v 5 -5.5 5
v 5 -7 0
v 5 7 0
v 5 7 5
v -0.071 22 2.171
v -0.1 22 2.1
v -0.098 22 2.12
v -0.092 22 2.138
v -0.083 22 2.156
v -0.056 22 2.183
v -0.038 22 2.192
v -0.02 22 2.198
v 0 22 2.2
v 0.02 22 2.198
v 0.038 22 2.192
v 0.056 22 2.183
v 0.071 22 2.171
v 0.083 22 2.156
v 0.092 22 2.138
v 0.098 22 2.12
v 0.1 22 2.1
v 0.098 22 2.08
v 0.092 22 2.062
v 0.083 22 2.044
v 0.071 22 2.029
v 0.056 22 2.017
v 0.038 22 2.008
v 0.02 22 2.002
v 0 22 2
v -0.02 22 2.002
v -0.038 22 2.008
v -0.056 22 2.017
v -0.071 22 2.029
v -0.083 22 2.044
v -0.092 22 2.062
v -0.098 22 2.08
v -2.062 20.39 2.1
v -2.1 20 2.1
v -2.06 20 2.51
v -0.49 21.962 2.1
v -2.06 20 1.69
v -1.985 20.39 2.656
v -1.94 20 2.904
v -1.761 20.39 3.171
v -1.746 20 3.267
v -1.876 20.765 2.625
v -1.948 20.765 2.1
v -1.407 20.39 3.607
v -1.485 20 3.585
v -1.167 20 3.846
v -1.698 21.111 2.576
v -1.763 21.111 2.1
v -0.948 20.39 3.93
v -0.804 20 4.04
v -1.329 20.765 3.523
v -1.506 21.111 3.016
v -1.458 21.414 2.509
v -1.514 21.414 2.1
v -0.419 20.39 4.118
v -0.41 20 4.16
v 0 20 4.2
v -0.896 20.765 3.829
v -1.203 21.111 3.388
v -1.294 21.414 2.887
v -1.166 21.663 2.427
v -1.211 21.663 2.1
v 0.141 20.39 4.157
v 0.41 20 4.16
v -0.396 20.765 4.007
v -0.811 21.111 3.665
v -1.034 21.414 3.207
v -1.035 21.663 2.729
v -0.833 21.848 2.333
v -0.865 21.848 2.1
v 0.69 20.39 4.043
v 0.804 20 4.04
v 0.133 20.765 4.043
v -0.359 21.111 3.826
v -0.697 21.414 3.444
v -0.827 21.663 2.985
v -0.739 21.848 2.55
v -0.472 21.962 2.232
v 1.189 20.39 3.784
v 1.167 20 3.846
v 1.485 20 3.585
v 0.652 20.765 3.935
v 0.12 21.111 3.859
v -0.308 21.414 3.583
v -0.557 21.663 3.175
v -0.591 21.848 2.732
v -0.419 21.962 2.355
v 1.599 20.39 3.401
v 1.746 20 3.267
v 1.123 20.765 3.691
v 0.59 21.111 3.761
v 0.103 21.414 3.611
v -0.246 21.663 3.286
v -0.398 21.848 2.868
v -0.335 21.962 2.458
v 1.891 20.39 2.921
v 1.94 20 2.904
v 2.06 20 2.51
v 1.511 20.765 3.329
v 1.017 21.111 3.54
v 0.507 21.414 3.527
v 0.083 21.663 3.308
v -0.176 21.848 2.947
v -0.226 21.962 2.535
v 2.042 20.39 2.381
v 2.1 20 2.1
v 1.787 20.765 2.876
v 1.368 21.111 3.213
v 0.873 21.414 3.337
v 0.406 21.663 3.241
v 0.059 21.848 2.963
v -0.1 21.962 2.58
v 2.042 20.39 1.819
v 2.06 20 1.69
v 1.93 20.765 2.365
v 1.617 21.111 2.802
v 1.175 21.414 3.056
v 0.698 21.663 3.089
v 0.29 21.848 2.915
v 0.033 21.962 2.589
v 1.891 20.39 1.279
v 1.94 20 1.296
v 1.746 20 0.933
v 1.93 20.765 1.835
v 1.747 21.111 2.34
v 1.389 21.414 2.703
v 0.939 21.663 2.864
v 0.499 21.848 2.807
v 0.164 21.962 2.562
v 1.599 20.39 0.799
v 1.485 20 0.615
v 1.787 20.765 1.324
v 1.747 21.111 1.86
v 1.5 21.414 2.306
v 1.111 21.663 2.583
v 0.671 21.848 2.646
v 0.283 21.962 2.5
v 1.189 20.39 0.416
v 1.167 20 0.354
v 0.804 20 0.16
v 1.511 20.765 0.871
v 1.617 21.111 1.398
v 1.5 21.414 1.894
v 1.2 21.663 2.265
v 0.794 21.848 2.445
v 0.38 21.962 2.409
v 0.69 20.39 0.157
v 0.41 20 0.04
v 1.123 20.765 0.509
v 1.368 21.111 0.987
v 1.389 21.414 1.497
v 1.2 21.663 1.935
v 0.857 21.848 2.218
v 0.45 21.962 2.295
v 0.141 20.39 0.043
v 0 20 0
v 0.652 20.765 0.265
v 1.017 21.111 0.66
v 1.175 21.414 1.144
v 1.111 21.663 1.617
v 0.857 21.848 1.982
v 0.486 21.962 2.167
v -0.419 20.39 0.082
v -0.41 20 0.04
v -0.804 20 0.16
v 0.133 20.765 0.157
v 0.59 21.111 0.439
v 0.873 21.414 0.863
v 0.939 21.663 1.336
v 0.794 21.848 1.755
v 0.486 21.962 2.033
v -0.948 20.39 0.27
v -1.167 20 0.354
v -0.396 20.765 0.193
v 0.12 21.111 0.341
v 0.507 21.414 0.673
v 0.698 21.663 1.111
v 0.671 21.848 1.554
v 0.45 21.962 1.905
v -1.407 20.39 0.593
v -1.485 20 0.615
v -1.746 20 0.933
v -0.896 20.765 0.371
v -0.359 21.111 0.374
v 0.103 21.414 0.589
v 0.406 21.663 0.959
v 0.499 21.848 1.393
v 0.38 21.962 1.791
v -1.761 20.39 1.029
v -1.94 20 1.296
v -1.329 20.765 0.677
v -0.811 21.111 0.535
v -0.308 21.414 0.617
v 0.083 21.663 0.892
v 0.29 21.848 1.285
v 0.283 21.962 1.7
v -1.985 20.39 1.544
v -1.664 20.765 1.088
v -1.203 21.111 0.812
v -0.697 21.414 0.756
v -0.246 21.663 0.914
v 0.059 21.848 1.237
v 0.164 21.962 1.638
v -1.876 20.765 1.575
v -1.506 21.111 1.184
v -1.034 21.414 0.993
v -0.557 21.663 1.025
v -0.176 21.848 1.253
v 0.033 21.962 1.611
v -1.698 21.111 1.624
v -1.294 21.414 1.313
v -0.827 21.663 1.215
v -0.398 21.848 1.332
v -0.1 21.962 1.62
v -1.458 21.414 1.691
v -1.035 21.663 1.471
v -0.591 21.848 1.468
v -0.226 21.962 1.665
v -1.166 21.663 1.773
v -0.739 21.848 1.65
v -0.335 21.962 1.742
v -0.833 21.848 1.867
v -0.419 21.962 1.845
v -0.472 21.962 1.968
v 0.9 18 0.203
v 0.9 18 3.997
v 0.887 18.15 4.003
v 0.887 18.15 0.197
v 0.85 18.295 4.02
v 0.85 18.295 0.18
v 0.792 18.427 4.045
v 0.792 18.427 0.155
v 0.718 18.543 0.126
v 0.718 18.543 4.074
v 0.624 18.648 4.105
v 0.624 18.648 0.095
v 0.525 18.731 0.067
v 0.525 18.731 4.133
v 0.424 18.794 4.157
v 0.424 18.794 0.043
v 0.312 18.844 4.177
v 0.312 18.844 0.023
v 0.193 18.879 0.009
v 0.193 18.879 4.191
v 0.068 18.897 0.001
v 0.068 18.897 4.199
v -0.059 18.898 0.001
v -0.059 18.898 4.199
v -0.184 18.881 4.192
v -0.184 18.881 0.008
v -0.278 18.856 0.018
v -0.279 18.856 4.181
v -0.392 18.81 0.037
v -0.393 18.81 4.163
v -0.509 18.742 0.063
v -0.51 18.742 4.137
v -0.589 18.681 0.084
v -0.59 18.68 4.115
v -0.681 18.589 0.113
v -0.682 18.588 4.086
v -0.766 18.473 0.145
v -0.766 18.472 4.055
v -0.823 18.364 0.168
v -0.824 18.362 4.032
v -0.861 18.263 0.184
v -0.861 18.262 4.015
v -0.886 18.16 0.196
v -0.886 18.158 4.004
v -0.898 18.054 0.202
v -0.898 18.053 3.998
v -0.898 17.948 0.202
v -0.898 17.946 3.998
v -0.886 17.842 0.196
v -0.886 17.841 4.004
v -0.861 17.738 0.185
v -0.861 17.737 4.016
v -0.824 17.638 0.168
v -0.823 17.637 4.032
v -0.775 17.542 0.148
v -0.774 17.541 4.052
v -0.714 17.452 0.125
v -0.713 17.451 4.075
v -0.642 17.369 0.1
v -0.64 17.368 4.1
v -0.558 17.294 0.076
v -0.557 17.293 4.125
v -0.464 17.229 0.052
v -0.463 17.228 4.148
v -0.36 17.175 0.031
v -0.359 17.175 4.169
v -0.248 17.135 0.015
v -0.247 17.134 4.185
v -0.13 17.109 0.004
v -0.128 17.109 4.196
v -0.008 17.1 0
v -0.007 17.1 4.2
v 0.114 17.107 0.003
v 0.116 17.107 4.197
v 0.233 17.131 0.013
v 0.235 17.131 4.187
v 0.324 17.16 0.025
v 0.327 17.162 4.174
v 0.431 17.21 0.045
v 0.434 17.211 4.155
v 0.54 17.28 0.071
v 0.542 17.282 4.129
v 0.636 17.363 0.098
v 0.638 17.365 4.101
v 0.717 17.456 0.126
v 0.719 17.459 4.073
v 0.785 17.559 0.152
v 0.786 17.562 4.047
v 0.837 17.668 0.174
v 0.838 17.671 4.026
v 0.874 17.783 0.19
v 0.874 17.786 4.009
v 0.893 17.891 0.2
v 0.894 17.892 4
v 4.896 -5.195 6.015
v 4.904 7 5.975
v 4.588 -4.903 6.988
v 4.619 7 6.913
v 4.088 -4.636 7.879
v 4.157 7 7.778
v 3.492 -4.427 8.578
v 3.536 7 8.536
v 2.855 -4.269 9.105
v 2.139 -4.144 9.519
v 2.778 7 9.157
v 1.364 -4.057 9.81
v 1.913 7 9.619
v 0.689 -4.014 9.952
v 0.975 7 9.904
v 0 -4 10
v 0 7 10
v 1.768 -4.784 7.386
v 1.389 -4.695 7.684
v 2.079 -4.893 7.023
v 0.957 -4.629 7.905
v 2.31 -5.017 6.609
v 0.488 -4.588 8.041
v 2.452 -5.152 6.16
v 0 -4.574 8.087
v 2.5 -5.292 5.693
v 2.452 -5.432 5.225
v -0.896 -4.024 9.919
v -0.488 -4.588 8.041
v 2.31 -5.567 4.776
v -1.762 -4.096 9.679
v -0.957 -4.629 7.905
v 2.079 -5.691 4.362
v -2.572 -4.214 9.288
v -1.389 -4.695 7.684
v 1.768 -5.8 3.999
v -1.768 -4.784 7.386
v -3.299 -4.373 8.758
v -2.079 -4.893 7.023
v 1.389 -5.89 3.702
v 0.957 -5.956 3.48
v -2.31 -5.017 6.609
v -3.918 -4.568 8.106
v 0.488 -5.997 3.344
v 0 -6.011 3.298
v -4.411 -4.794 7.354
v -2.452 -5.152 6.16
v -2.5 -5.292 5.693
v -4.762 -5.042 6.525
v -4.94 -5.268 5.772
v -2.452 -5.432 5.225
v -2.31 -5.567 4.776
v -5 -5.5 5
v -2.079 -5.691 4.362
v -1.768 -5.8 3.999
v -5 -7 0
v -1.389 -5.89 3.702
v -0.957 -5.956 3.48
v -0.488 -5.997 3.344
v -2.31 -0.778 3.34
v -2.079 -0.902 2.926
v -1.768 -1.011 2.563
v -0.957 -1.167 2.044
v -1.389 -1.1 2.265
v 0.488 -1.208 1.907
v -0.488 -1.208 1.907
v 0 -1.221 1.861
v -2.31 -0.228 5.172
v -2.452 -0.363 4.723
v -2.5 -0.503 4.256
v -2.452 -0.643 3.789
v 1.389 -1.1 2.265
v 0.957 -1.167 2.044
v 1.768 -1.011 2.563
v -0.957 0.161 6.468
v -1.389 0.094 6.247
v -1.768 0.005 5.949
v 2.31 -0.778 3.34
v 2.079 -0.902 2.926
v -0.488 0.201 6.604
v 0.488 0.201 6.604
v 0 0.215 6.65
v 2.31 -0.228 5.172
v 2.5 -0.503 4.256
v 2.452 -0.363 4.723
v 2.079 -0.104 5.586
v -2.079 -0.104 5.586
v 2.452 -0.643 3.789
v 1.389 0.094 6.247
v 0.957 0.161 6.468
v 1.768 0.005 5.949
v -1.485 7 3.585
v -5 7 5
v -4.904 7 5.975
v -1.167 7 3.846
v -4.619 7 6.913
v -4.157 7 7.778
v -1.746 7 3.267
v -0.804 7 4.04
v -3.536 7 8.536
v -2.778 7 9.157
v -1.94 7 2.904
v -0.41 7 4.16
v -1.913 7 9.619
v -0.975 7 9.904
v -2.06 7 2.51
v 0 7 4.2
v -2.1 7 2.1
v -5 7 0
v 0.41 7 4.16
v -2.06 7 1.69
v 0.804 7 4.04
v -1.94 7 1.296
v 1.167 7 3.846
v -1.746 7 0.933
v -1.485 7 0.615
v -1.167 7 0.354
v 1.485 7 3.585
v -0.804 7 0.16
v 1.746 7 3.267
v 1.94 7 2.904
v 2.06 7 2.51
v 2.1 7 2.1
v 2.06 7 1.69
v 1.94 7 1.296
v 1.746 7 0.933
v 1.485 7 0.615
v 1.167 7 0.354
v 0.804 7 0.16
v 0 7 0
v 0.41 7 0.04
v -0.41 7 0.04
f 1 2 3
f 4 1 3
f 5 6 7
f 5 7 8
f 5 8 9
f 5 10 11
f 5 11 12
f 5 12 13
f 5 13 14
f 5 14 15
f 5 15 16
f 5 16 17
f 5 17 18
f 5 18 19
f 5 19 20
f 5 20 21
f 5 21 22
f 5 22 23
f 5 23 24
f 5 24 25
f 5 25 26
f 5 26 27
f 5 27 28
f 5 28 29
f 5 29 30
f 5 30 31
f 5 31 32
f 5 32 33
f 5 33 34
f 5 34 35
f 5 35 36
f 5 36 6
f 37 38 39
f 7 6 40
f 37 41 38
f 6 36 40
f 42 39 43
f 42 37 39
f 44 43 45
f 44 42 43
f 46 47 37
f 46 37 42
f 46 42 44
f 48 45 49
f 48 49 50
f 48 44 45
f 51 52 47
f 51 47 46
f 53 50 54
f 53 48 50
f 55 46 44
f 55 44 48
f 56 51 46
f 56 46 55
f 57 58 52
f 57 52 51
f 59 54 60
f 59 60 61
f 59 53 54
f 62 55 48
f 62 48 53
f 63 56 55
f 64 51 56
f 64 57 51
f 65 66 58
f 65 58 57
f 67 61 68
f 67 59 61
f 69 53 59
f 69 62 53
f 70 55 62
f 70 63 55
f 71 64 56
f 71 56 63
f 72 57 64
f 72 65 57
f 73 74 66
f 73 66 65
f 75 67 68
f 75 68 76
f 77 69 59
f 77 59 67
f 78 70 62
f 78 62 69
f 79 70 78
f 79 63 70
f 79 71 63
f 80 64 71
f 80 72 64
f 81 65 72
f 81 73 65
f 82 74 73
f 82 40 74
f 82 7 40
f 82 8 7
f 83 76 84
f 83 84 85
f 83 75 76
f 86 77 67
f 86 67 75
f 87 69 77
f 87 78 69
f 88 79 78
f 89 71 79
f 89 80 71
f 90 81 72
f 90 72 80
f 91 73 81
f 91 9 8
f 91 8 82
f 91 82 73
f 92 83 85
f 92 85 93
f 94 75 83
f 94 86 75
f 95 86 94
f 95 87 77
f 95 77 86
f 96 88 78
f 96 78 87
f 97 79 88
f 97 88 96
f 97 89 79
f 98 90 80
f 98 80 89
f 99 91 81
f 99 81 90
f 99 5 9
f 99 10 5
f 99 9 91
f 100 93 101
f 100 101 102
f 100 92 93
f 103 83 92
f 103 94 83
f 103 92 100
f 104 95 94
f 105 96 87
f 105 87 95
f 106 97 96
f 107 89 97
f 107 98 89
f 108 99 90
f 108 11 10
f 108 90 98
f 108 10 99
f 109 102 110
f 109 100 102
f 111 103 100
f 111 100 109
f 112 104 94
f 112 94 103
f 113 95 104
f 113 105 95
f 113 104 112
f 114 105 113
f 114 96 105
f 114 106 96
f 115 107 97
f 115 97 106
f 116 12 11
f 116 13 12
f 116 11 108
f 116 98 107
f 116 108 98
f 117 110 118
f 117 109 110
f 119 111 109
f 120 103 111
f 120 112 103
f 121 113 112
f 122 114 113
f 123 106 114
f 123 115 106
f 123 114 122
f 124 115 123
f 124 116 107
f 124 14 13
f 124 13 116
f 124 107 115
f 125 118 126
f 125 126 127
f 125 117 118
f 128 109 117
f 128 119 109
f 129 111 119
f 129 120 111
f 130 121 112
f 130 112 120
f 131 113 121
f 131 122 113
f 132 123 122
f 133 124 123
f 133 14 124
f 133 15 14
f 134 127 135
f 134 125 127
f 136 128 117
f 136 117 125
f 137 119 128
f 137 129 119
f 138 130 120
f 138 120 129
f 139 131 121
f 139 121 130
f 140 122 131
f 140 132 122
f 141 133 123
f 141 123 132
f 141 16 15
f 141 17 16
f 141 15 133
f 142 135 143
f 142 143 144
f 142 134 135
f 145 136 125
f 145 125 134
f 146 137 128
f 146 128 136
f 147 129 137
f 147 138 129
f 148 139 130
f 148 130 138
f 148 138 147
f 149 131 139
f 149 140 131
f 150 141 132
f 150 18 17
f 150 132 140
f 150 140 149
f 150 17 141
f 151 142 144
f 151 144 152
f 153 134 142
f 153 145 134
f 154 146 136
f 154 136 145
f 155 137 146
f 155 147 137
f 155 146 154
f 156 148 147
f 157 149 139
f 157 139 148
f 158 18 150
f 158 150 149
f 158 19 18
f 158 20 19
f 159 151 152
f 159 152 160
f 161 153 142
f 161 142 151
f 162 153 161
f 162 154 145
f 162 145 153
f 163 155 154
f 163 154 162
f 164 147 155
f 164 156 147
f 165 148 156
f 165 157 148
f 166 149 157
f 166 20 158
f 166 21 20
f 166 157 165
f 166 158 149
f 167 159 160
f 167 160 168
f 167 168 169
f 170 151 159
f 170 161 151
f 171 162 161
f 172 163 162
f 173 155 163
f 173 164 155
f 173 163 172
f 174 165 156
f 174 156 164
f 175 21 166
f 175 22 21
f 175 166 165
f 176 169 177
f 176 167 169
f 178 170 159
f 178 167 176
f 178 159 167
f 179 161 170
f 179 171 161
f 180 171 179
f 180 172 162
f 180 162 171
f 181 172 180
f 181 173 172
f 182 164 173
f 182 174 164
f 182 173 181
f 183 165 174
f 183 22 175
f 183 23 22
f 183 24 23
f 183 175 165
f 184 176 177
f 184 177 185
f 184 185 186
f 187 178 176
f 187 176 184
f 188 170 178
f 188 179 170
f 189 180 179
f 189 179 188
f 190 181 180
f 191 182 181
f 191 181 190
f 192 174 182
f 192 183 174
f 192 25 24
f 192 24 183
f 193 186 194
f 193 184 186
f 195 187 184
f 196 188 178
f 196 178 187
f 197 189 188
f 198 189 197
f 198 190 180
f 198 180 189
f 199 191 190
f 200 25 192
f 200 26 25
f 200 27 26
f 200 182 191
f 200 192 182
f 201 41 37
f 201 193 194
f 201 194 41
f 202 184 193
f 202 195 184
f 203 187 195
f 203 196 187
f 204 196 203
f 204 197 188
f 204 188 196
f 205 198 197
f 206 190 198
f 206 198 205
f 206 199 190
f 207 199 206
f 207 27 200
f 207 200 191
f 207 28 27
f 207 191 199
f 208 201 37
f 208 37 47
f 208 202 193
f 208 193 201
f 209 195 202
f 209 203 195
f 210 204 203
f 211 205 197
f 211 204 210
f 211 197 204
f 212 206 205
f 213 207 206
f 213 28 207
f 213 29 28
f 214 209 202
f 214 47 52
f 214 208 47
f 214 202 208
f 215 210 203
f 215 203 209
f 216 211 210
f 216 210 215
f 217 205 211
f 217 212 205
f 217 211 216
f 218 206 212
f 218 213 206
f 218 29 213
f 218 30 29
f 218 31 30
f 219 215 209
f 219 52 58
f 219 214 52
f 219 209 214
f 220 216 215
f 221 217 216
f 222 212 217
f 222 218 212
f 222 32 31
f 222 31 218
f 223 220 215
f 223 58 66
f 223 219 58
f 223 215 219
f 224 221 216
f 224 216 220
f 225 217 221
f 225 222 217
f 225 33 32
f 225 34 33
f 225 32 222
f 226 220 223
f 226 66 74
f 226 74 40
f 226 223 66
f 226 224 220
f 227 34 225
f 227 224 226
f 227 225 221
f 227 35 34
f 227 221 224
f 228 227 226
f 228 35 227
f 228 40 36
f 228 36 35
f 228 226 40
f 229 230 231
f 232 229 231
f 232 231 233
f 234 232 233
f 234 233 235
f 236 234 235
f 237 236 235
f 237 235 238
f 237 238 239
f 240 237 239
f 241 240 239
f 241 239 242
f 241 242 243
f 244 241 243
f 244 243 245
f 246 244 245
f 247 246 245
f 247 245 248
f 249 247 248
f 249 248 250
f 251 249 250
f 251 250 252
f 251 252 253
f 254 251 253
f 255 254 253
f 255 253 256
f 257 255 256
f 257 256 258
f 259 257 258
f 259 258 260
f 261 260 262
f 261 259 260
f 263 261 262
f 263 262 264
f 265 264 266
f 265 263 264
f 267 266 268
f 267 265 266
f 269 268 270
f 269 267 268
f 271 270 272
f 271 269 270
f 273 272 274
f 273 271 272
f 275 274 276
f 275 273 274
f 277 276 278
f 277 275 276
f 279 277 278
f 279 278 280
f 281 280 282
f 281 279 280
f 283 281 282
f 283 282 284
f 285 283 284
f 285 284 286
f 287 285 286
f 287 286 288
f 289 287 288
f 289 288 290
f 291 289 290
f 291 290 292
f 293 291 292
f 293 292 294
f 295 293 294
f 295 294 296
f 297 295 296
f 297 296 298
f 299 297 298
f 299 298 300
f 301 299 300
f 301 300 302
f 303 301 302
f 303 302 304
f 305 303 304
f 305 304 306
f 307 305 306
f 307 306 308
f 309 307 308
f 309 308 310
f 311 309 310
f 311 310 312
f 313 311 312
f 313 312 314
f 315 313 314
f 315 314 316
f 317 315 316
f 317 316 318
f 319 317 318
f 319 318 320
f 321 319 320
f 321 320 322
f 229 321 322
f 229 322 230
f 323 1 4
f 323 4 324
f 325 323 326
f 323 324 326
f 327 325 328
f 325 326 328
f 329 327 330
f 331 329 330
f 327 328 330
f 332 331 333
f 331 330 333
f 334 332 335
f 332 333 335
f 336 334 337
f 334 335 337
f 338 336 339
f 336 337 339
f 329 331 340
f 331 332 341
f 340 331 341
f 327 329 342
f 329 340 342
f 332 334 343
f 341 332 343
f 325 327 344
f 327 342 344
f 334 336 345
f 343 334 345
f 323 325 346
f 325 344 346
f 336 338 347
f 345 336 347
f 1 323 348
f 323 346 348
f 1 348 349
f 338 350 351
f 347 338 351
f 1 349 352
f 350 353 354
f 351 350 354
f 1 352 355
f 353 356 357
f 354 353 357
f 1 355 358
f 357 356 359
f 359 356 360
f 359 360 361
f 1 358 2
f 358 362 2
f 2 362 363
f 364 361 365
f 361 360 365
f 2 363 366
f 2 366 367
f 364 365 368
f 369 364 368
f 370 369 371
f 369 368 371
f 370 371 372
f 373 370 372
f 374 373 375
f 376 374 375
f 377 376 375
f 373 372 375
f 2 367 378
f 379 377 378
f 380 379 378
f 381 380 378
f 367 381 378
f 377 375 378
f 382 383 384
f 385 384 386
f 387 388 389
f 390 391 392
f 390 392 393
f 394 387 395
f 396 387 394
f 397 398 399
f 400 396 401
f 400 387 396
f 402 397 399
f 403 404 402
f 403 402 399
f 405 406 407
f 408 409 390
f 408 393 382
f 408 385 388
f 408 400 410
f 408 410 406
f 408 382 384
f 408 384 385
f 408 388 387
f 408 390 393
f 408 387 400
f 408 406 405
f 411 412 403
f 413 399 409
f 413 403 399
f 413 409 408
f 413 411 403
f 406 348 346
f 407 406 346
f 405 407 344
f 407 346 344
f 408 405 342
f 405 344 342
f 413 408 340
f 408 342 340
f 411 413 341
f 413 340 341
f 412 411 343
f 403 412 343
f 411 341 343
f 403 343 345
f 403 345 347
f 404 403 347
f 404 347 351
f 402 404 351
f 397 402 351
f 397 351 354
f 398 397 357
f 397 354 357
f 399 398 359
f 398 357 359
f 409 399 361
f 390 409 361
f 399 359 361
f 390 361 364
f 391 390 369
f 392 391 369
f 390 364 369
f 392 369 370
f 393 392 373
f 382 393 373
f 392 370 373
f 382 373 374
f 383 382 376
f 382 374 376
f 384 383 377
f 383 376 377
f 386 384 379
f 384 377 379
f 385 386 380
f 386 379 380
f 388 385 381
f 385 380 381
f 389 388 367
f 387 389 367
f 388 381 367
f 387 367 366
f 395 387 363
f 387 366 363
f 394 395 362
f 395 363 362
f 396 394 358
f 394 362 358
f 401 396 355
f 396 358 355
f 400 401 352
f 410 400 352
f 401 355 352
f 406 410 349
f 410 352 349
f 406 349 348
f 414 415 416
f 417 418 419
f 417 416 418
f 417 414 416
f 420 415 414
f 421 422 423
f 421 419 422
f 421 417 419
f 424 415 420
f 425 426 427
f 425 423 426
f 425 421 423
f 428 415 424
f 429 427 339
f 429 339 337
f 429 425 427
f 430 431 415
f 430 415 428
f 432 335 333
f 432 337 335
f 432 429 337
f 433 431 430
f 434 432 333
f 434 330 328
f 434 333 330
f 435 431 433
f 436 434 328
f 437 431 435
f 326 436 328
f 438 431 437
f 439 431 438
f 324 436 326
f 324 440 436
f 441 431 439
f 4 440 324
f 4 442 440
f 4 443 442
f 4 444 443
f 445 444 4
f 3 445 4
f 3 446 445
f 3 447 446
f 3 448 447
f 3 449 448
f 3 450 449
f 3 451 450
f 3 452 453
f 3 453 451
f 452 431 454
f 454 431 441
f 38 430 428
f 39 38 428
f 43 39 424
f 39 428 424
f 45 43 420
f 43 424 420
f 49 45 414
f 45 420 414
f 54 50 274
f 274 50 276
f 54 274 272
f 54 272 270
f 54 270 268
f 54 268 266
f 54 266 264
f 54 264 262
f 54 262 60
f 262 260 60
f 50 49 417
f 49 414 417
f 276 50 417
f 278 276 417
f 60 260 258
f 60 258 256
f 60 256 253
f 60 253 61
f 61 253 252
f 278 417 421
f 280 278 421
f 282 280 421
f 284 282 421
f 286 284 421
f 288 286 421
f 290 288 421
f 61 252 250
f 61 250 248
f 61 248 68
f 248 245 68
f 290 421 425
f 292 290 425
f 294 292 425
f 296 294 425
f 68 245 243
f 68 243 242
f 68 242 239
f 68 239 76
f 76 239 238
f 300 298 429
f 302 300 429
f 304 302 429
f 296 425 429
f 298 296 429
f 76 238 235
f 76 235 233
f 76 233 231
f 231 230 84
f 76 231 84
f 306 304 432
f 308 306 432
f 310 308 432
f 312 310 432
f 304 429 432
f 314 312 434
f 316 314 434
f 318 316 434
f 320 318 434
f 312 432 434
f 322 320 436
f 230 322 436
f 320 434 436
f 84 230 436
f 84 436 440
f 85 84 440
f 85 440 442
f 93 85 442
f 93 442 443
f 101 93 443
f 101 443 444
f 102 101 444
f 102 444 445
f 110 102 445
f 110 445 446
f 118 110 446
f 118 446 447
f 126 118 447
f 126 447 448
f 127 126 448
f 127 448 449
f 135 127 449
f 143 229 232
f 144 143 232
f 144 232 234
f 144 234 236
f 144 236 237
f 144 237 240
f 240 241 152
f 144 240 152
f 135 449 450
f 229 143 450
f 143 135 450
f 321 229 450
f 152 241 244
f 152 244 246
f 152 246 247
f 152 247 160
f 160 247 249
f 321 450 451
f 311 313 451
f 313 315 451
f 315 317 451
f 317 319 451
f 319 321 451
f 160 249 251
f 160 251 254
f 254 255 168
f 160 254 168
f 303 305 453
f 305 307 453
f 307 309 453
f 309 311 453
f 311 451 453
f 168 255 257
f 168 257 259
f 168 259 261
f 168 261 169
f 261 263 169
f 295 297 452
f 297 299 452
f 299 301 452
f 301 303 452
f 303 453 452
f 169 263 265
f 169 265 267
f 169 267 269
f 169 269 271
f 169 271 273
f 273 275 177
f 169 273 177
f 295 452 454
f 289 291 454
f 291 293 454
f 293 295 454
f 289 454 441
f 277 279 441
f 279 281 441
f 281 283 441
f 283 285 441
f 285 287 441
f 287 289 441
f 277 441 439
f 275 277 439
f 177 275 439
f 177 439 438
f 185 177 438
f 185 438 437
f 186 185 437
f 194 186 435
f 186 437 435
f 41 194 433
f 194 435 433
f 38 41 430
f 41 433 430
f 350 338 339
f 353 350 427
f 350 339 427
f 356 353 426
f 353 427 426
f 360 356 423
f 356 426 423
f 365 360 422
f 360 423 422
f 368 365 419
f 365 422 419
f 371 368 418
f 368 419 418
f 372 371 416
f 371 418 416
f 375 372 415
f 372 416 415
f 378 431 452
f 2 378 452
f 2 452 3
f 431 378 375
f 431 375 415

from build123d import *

# Parameters (mm, degrees)
F0_W      = 10
F0_H      = 14
F1_DEPTH  = 10
F2_R      = 2.1
F3_DEPTH  = 15
F4_R      = 0.9
F5_DEPTH  = 5
F6_R      = 2
F8_DEPTH  = 10
F9_R      = 2.5
F10_DEPTH = 5
F11_R     = 4.99999


# Not quite as in the source:
# - a fillet or chamfer is up to 0.001 mm smaller than in the source, because OpenCascade refuses the exact size


with BuildPart() as f1:
    # F0 (on Top) → F1 (new body)
    with BuildSketch(Plane.XY):
        Rectangle(F0_W, F0_H)
    extrude(amount=F1_DEPTH)

    # F2 (on face) → F3 (join)
    with BuildSketch(Plane(origin=(0, 7, 0), x_dir=(-1, 0, 0), z_dir=(0, 1, 0))):
        with Locations((0, 2.1)):
            Circle(F2_R)
    extrude(amount=F3_DEPTH)

    # F4 (on Top) → F5 (cut)
    with BuildSketch(Plane.XY):
        with Locations((0, 18)):
            Circle(F4_R)
    extrude(amount=F5_DEPTH, mode=Mode.SUBTRACT)

    # F6
    f6_edges = [f1.edges().sort_by_distance(p)[0] for p in [
        (2.1, 22, 2.1),
    ]]
    fillet(f6_edges, radius=F6_R)

    # F7 (on face) → F8 (cut)
    with BuildSketch(Plane(origin=(-5, 0, 0), x_dir=(0, -1, 0), z_dir=(-1, 0, 0))):
        Polygon((4, 10), (7, 0), (7, 10), align=None)
    extrude(amount=-F8_DEPTH, mode=Mode.SUBTRACT)

    # F9 (on face) → F10 (cut)
    with BuildSketch(Plane(origin=(0, -6.4220183486, 1.9266055046), x_dir=(1, 0, 0), z_dir=(0, -0.9578262852, 0.2873478856))):
        with Locations((0, 3.9318241179)):
            Circle(F9_R)
    extrude(amount=-F10_DEPTH, mode=Mode.SUBTRACT)

    # F11 (radius 5 in the source; OpenCascade refuses exactly that, so slightly less here)
    f11_edges = [f1.edges().sort_by_distance(p)[0] for p in [
        (-5, 1.5, 10),
        (5, 1.5, 10),
    ]]
    fillet(f11_edges, radius=F11_R)


solid = f1.part
